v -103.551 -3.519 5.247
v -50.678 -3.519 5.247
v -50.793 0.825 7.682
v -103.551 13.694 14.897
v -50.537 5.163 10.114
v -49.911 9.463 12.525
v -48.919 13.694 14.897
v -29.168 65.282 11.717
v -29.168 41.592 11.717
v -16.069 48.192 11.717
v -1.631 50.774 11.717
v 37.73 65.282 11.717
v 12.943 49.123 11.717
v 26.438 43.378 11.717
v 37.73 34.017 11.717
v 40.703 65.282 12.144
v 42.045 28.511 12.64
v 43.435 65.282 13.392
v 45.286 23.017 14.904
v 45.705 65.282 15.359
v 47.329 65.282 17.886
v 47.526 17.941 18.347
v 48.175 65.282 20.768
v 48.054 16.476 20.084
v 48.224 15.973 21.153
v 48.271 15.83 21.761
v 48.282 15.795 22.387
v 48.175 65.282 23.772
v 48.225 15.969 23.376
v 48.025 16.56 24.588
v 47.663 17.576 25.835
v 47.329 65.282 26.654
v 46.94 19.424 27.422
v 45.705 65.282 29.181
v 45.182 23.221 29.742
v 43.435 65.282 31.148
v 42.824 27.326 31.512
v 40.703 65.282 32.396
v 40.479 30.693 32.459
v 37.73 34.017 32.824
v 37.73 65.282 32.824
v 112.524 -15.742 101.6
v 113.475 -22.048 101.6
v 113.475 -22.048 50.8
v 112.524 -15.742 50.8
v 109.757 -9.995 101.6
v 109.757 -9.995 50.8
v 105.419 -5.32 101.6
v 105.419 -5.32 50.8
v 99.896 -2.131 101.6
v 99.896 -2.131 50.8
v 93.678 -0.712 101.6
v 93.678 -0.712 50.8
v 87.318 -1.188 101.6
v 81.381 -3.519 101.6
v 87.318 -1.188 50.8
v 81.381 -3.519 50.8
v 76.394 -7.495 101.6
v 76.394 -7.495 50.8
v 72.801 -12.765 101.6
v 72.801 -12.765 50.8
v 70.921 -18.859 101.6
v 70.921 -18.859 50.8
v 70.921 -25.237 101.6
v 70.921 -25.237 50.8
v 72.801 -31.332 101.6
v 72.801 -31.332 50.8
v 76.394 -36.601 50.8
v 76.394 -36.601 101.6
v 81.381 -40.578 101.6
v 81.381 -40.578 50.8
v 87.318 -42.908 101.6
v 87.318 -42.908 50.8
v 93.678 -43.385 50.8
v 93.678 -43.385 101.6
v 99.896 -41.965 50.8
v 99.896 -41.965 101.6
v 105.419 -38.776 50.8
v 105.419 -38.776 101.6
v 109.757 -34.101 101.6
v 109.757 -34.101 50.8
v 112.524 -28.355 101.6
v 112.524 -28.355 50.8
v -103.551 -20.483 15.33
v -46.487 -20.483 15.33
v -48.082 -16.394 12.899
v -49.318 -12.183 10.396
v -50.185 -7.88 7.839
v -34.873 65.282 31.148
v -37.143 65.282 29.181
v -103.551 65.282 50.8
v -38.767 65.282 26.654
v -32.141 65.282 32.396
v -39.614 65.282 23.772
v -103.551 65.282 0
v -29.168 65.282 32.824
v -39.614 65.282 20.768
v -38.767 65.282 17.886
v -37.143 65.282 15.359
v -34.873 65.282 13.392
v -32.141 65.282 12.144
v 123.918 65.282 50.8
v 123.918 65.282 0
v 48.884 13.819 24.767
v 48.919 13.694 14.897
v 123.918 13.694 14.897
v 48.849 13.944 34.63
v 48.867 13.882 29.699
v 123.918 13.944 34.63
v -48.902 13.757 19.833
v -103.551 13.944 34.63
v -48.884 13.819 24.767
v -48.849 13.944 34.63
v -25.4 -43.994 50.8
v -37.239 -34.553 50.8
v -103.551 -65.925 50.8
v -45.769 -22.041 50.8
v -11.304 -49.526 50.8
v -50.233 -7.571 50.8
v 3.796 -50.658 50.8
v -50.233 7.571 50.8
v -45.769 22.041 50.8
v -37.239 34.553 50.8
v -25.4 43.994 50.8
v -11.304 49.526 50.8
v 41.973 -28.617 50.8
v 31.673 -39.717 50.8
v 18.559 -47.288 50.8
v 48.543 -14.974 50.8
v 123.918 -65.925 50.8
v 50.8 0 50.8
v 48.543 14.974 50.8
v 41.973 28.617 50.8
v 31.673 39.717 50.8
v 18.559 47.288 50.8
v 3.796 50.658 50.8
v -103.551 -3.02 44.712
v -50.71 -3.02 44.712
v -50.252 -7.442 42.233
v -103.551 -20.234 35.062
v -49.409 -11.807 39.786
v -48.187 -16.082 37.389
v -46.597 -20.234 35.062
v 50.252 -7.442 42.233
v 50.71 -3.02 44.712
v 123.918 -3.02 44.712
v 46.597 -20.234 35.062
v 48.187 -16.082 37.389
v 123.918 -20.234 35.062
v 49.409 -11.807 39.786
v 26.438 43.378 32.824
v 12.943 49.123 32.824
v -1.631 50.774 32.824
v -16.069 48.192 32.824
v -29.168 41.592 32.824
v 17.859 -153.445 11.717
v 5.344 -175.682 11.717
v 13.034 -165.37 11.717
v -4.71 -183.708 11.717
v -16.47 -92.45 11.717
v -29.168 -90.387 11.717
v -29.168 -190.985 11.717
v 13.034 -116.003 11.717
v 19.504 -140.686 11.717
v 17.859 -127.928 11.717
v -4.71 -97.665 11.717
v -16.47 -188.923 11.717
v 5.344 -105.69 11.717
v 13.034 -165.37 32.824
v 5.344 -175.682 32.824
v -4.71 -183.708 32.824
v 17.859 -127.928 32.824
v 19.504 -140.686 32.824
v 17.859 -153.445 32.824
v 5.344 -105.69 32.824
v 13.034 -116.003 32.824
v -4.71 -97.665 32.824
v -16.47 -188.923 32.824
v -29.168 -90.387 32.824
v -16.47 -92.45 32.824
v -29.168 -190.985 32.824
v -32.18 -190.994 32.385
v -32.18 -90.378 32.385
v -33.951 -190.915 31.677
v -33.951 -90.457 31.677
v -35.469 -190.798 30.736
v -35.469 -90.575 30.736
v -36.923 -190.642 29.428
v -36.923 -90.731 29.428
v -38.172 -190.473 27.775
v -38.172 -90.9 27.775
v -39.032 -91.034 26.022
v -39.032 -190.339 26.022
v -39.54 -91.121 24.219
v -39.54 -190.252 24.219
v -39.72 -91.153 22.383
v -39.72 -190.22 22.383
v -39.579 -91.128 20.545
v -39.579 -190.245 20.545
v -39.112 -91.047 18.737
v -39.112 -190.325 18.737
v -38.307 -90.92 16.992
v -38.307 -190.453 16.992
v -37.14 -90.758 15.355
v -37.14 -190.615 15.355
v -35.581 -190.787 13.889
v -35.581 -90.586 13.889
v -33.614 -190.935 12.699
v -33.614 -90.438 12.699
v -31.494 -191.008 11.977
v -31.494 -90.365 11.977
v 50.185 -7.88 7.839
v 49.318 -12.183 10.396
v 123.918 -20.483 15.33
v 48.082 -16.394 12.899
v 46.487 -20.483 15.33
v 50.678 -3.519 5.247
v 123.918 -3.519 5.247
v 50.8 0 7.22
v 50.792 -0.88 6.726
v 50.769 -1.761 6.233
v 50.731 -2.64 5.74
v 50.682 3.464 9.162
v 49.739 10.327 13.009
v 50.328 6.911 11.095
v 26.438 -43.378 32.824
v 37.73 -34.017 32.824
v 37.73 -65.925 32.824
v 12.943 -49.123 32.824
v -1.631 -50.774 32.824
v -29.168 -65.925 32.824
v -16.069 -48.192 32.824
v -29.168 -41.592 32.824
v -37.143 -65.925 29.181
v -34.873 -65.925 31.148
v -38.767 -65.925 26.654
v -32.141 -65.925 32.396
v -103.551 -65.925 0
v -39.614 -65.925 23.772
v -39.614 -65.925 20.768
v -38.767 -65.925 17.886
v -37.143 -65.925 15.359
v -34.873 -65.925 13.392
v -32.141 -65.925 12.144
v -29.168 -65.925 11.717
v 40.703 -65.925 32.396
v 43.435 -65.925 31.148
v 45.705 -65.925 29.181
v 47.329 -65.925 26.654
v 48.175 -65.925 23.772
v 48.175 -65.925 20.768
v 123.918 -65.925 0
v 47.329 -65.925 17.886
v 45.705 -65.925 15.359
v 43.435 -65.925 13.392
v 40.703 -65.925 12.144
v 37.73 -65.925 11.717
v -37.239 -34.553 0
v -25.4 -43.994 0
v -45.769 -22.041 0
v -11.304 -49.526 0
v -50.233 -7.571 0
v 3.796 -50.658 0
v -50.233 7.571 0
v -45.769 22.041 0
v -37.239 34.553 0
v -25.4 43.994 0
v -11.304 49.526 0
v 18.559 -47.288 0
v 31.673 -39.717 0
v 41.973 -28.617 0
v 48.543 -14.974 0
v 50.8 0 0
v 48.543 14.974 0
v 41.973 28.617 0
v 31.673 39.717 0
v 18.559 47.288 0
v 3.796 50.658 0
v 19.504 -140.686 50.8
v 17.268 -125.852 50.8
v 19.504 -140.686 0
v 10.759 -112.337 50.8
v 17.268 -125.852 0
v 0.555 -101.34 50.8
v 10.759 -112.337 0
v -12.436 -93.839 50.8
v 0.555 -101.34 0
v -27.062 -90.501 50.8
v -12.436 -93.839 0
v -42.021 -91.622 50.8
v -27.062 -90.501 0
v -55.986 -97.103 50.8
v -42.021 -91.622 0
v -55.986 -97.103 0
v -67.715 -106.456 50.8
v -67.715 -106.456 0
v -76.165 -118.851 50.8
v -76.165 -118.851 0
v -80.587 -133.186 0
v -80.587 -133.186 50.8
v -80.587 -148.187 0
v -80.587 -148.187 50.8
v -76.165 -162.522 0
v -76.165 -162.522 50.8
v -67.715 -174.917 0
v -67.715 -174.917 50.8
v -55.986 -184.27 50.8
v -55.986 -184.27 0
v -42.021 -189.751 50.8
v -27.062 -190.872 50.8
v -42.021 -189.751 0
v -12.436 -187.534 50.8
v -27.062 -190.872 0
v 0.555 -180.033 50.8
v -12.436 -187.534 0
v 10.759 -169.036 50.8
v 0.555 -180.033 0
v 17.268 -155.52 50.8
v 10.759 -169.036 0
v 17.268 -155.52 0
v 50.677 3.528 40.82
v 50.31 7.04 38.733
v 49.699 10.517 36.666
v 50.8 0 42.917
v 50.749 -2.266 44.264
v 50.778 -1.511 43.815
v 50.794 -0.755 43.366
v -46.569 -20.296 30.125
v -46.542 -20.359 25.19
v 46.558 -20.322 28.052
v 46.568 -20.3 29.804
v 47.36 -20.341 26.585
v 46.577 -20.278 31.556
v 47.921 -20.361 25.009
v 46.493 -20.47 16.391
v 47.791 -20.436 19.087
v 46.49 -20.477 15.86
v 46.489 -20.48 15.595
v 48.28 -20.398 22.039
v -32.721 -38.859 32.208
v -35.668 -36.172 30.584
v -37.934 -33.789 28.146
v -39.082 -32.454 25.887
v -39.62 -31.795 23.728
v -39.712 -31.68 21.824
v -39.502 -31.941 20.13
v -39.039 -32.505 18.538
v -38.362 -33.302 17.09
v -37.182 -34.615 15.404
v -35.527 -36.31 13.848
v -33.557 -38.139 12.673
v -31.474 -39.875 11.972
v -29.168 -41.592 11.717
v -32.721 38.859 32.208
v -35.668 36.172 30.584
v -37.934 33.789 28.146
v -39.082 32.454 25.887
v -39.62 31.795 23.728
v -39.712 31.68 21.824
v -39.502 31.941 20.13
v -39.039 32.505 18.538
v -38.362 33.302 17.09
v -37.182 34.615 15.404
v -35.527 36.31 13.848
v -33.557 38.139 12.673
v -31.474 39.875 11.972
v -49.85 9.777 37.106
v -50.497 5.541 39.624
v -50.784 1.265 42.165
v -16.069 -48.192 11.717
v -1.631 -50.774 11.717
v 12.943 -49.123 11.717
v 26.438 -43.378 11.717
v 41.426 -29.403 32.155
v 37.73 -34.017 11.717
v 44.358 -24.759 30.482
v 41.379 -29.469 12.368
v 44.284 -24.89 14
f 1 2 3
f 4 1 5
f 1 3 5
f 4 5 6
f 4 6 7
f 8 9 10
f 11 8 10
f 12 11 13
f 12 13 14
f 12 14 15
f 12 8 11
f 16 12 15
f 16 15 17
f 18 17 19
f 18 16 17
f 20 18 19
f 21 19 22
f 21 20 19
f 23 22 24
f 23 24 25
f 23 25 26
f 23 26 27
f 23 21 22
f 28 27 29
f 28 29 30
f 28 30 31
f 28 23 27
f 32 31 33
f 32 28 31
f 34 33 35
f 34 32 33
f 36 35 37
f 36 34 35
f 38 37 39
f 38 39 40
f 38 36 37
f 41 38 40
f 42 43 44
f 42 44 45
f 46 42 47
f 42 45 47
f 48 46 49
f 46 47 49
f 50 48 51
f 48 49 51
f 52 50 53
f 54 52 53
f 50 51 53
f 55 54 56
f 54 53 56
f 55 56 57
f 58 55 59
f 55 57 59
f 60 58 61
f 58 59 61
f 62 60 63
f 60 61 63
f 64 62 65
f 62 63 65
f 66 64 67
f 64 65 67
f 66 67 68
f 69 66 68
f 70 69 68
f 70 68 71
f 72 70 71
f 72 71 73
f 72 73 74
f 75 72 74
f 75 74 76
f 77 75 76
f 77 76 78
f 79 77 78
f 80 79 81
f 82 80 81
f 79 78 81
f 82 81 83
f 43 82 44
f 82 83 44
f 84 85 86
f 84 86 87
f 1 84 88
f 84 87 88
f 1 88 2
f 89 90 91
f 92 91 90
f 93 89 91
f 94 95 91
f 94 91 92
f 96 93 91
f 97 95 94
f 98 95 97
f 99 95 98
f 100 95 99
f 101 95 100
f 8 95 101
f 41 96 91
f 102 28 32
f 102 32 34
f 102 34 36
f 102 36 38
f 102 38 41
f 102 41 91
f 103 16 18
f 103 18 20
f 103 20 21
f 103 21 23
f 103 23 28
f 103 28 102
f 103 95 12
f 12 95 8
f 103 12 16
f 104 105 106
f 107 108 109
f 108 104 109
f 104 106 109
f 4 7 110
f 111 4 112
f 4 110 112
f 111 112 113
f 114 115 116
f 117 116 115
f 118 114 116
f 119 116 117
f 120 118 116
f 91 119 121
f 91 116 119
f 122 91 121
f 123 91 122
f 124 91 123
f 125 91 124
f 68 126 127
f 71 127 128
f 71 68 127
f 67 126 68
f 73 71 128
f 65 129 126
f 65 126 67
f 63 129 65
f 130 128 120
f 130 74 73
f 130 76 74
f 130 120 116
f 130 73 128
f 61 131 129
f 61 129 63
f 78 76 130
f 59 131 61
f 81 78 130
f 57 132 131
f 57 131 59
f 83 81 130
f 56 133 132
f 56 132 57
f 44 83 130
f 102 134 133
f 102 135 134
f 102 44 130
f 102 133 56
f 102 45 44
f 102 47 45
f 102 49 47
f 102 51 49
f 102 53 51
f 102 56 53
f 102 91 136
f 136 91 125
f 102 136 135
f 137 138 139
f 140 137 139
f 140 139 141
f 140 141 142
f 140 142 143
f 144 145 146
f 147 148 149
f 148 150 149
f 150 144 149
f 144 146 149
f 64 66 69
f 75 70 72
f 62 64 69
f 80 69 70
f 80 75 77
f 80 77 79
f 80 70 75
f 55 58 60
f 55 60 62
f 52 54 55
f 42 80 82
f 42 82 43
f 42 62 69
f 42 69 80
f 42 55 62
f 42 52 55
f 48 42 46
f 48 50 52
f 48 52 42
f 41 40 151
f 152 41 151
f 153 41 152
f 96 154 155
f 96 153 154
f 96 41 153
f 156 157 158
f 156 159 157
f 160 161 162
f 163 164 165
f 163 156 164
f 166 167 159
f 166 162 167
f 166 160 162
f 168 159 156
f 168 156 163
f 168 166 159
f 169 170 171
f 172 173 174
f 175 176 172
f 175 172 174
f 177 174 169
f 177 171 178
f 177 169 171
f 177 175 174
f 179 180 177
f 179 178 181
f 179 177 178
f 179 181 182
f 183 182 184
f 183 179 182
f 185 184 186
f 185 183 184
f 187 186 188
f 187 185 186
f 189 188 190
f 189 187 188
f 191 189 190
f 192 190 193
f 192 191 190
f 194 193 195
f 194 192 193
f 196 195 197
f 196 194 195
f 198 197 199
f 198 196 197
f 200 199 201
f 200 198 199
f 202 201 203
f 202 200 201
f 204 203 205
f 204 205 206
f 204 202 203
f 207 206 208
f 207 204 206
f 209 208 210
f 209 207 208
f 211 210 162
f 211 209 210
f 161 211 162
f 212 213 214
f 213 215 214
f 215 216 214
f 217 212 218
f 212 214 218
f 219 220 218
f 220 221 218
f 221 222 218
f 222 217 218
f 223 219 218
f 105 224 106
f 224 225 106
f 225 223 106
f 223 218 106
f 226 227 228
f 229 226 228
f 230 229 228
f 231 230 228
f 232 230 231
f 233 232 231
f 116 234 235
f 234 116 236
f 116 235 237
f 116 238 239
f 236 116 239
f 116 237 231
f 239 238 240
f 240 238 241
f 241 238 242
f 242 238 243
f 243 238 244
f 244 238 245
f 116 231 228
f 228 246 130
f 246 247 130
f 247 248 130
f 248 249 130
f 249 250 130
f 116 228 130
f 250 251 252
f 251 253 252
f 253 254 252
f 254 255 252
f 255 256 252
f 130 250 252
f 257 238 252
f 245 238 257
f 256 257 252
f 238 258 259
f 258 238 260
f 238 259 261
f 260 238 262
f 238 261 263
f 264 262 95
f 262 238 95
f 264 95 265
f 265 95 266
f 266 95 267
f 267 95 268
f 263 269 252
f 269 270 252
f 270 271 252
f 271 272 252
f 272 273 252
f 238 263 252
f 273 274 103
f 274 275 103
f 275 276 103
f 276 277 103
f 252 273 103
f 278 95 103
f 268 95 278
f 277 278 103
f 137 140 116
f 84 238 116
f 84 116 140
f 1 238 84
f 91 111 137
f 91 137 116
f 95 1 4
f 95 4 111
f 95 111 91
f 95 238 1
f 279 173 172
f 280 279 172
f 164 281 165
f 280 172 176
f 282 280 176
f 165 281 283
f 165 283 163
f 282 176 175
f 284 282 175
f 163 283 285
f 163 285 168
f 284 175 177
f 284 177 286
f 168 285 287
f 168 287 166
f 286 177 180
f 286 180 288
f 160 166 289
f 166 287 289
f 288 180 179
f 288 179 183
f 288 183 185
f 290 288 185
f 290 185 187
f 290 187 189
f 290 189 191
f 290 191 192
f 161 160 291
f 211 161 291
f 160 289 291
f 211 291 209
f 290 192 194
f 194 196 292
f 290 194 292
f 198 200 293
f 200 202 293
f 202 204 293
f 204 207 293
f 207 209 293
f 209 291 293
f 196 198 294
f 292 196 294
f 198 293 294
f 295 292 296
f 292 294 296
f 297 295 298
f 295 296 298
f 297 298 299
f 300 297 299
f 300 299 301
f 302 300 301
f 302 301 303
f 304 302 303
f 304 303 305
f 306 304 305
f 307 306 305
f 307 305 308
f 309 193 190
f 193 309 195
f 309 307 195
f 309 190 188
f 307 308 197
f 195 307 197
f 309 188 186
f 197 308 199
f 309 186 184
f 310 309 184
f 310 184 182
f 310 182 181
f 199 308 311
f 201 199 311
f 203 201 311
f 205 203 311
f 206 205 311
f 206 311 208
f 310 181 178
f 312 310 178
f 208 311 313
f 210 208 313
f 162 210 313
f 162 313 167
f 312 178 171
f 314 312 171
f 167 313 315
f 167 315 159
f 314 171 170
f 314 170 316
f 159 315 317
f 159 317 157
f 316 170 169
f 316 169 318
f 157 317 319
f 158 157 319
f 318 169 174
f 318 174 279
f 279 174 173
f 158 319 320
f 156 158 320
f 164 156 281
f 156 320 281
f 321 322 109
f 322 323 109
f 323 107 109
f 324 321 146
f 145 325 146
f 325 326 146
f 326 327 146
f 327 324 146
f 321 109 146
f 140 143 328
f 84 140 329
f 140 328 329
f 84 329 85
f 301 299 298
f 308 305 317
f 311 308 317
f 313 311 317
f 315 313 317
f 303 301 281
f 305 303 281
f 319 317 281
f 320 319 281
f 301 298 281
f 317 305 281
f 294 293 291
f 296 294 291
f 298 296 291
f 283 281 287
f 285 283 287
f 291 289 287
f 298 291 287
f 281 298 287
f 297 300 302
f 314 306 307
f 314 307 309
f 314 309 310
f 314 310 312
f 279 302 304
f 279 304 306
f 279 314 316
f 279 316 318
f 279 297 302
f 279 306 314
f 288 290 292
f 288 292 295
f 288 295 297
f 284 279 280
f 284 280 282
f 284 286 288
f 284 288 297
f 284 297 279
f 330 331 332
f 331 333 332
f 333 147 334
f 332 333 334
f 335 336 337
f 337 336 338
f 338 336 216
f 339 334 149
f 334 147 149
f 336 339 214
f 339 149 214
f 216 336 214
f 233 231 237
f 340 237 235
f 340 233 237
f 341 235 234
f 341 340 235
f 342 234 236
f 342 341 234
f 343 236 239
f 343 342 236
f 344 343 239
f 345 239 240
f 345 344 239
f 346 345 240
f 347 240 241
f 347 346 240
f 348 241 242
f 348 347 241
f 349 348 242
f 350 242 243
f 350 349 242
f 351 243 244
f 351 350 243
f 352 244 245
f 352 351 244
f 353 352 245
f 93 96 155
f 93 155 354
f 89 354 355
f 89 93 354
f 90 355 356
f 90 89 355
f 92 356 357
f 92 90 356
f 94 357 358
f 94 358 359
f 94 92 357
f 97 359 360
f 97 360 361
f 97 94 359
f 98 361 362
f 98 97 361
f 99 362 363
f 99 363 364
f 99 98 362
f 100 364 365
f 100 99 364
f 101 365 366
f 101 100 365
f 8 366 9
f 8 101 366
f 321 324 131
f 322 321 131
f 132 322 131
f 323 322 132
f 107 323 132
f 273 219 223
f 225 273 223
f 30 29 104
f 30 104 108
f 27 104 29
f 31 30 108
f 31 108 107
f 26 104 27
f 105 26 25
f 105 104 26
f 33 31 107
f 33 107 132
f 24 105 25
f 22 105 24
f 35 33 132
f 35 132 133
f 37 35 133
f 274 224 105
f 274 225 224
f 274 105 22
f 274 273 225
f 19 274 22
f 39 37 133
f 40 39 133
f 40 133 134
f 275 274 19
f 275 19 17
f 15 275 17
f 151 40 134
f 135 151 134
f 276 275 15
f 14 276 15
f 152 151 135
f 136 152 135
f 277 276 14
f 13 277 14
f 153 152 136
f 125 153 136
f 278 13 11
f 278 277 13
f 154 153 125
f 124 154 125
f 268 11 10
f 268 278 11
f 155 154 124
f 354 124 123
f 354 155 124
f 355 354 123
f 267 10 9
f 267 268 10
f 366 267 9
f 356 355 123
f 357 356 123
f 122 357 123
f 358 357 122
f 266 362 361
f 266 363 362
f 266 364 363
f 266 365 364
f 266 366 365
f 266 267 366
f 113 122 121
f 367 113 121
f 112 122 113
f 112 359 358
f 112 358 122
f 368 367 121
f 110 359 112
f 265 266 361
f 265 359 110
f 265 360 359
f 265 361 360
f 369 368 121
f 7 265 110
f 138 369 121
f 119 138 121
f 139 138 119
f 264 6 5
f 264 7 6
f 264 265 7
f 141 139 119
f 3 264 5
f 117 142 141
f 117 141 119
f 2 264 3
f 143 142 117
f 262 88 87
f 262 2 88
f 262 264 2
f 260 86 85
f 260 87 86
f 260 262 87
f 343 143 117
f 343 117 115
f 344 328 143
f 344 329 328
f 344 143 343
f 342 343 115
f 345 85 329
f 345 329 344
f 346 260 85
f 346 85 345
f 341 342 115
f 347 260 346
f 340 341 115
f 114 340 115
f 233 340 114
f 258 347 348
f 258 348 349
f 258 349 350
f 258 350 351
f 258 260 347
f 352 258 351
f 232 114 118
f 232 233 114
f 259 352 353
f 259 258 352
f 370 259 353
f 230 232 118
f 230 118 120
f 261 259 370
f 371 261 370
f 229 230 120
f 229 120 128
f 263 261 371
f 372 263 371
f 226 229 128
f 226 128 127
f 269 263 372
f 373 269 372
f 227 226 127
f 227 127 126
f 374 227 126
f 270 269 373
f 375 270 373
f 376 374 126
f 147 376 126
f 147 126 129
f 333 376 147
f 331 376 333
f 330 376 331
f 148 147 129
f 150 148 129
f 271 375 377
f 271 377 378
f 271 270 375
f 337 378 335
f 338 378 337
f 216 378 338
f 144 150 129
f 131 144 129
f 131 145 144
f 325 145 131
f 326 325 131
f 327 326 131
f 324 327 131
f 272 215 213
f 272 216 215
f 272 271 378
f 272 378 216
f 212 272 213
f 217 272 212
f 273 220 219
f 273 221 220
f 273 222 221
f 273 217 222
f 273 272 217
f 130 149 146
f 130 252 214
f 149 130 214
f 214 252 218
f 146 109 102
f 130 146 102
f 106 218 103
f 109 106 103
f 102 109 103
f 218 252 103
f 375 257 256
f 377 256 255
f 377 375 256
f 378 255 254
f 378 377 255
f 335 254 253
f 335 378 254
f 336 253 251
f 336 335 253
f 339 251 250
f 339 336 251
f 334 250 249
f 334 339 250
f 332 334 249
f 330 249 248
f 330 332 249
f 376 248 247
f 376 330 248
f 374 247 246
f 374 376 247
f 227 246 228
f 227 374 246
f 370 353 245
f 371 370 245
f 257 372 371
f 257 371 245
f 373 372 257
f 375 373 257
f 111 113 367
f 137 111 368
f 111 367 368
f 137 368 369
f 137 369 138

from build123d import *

# Parameters (mm, degrees)
SKETCH1_R             = 50.326297337
BOSS_EXTRUDE1_DEPTH   = 50.8
SKETCH1_W             = 227.468999718
SKETCH1_H             = 131.207377783
SKETCH1_R_2           = 50.8
BOSS_EXTRUDE1_2_DEPTH = 50.8
CUT_EXTRUDE1_DEPTH    = 302.344719427
SKETCH2_R             = 21.396142598
BOSS_EXTRUDE2_DEPTH   = 50.8
CUT_EXTRUDE2_DEPTH    = 303.266900818


with BuildPart() as part:
    # Sketch1 → Boss-Extrude1 (new body)
    with BuildSketch(Plane.XY):
        with Locations((-30.822755562, -140.686409292)):
            Circle(SKETCH1_R)
    extrude(amount=BOSS_EXTRUDE1_DEPTH)


with BuildPart() as body_2:
    # Sketch1 → Boss-Extrude1 2 (new body)
    with BuildSketch(Plane.XY):
        with Locations((10.183579158, -0.321586711)):
            Rectangle(SKETCH1_W, SKETCH1_H)
        Circle(SKETCH1_R_2, mode=Mode.SUBTRACT)
    extrude(amount=BOSS_EXTRUDE1_2_DEPTH)

    # Sketch3 → Cut-Extrude1 (cut, through all)
    with BuildSketch(Plane(origin=(123.918079017, 0, 0), x_dir=(0, 0, -1), z_dir=(1, 0, 0))):
        Polygon((-15.329536796, -20.483314939), (-5.247141964, -3.519320764), (-14.897194453, 13.694286379), (-34.629641774, 13.943899347), (-44.712036607, -3.020094828), (-35.061984117, -20.233701971), align=None)
    extrude(amount=-CUT_EXTRUDE1_DEPTH, mode=Mode.SUBTRACT)

    # Sketch2 → Boss-Extrude2 (add)
    with BuildSketch(Plane.XY.offset(50.8)):
        with Locations((92.078619203, -22.048188316)):
            Circle(SKETCH2_R)
    extrude(amount=BOSS_EXTRUDE2_DEPTH)


with BuildPart() as cut_extrude2_tool:
    # Sketch4 → Cut-Extrude2 (new, through all)
    with BuildSketch(Plane(origin=(0, 65.282102181, 0), x_dir=(1, 0, 0), z_dir=(0, 1, 0))):
        with BuildLine():
            Line((-29.167738676, -11.716986605), (37.729501642, -11.716986605))
            ThreePointArc((37.729501642, -11.716986605), (48.282809607, -22.27029457), (37.729501642, -32.823602535))
            Line((37.729501642, -32.823602535), (-29.167738676, -32.823602535))
            ThreePointArc((-29.167738676, -32.823602535), (-39.721046641, -22.27029457), (-29.167738676, -11.716986605))
        make_face()
    extrude(amount=-CUT_EXTRUDE2_DEPTH)


with BuildPart() as part_1:
    add(part.part)

    # Cut-Extrude2: cut by cut_extrude2_tool
    add(cut_extrude2_tool.part, mode=Mode.SUBTRACT)


with BuildPart() as body_2_1:
    add(body_2.part)

    # Cut-Extrude2: cut by cut_extrude2_tool
    add(cut_extrude2_tool.part, mode=Mode.SUBTRACT)


solid = Compound([part_1.part, body_2_1.part])
